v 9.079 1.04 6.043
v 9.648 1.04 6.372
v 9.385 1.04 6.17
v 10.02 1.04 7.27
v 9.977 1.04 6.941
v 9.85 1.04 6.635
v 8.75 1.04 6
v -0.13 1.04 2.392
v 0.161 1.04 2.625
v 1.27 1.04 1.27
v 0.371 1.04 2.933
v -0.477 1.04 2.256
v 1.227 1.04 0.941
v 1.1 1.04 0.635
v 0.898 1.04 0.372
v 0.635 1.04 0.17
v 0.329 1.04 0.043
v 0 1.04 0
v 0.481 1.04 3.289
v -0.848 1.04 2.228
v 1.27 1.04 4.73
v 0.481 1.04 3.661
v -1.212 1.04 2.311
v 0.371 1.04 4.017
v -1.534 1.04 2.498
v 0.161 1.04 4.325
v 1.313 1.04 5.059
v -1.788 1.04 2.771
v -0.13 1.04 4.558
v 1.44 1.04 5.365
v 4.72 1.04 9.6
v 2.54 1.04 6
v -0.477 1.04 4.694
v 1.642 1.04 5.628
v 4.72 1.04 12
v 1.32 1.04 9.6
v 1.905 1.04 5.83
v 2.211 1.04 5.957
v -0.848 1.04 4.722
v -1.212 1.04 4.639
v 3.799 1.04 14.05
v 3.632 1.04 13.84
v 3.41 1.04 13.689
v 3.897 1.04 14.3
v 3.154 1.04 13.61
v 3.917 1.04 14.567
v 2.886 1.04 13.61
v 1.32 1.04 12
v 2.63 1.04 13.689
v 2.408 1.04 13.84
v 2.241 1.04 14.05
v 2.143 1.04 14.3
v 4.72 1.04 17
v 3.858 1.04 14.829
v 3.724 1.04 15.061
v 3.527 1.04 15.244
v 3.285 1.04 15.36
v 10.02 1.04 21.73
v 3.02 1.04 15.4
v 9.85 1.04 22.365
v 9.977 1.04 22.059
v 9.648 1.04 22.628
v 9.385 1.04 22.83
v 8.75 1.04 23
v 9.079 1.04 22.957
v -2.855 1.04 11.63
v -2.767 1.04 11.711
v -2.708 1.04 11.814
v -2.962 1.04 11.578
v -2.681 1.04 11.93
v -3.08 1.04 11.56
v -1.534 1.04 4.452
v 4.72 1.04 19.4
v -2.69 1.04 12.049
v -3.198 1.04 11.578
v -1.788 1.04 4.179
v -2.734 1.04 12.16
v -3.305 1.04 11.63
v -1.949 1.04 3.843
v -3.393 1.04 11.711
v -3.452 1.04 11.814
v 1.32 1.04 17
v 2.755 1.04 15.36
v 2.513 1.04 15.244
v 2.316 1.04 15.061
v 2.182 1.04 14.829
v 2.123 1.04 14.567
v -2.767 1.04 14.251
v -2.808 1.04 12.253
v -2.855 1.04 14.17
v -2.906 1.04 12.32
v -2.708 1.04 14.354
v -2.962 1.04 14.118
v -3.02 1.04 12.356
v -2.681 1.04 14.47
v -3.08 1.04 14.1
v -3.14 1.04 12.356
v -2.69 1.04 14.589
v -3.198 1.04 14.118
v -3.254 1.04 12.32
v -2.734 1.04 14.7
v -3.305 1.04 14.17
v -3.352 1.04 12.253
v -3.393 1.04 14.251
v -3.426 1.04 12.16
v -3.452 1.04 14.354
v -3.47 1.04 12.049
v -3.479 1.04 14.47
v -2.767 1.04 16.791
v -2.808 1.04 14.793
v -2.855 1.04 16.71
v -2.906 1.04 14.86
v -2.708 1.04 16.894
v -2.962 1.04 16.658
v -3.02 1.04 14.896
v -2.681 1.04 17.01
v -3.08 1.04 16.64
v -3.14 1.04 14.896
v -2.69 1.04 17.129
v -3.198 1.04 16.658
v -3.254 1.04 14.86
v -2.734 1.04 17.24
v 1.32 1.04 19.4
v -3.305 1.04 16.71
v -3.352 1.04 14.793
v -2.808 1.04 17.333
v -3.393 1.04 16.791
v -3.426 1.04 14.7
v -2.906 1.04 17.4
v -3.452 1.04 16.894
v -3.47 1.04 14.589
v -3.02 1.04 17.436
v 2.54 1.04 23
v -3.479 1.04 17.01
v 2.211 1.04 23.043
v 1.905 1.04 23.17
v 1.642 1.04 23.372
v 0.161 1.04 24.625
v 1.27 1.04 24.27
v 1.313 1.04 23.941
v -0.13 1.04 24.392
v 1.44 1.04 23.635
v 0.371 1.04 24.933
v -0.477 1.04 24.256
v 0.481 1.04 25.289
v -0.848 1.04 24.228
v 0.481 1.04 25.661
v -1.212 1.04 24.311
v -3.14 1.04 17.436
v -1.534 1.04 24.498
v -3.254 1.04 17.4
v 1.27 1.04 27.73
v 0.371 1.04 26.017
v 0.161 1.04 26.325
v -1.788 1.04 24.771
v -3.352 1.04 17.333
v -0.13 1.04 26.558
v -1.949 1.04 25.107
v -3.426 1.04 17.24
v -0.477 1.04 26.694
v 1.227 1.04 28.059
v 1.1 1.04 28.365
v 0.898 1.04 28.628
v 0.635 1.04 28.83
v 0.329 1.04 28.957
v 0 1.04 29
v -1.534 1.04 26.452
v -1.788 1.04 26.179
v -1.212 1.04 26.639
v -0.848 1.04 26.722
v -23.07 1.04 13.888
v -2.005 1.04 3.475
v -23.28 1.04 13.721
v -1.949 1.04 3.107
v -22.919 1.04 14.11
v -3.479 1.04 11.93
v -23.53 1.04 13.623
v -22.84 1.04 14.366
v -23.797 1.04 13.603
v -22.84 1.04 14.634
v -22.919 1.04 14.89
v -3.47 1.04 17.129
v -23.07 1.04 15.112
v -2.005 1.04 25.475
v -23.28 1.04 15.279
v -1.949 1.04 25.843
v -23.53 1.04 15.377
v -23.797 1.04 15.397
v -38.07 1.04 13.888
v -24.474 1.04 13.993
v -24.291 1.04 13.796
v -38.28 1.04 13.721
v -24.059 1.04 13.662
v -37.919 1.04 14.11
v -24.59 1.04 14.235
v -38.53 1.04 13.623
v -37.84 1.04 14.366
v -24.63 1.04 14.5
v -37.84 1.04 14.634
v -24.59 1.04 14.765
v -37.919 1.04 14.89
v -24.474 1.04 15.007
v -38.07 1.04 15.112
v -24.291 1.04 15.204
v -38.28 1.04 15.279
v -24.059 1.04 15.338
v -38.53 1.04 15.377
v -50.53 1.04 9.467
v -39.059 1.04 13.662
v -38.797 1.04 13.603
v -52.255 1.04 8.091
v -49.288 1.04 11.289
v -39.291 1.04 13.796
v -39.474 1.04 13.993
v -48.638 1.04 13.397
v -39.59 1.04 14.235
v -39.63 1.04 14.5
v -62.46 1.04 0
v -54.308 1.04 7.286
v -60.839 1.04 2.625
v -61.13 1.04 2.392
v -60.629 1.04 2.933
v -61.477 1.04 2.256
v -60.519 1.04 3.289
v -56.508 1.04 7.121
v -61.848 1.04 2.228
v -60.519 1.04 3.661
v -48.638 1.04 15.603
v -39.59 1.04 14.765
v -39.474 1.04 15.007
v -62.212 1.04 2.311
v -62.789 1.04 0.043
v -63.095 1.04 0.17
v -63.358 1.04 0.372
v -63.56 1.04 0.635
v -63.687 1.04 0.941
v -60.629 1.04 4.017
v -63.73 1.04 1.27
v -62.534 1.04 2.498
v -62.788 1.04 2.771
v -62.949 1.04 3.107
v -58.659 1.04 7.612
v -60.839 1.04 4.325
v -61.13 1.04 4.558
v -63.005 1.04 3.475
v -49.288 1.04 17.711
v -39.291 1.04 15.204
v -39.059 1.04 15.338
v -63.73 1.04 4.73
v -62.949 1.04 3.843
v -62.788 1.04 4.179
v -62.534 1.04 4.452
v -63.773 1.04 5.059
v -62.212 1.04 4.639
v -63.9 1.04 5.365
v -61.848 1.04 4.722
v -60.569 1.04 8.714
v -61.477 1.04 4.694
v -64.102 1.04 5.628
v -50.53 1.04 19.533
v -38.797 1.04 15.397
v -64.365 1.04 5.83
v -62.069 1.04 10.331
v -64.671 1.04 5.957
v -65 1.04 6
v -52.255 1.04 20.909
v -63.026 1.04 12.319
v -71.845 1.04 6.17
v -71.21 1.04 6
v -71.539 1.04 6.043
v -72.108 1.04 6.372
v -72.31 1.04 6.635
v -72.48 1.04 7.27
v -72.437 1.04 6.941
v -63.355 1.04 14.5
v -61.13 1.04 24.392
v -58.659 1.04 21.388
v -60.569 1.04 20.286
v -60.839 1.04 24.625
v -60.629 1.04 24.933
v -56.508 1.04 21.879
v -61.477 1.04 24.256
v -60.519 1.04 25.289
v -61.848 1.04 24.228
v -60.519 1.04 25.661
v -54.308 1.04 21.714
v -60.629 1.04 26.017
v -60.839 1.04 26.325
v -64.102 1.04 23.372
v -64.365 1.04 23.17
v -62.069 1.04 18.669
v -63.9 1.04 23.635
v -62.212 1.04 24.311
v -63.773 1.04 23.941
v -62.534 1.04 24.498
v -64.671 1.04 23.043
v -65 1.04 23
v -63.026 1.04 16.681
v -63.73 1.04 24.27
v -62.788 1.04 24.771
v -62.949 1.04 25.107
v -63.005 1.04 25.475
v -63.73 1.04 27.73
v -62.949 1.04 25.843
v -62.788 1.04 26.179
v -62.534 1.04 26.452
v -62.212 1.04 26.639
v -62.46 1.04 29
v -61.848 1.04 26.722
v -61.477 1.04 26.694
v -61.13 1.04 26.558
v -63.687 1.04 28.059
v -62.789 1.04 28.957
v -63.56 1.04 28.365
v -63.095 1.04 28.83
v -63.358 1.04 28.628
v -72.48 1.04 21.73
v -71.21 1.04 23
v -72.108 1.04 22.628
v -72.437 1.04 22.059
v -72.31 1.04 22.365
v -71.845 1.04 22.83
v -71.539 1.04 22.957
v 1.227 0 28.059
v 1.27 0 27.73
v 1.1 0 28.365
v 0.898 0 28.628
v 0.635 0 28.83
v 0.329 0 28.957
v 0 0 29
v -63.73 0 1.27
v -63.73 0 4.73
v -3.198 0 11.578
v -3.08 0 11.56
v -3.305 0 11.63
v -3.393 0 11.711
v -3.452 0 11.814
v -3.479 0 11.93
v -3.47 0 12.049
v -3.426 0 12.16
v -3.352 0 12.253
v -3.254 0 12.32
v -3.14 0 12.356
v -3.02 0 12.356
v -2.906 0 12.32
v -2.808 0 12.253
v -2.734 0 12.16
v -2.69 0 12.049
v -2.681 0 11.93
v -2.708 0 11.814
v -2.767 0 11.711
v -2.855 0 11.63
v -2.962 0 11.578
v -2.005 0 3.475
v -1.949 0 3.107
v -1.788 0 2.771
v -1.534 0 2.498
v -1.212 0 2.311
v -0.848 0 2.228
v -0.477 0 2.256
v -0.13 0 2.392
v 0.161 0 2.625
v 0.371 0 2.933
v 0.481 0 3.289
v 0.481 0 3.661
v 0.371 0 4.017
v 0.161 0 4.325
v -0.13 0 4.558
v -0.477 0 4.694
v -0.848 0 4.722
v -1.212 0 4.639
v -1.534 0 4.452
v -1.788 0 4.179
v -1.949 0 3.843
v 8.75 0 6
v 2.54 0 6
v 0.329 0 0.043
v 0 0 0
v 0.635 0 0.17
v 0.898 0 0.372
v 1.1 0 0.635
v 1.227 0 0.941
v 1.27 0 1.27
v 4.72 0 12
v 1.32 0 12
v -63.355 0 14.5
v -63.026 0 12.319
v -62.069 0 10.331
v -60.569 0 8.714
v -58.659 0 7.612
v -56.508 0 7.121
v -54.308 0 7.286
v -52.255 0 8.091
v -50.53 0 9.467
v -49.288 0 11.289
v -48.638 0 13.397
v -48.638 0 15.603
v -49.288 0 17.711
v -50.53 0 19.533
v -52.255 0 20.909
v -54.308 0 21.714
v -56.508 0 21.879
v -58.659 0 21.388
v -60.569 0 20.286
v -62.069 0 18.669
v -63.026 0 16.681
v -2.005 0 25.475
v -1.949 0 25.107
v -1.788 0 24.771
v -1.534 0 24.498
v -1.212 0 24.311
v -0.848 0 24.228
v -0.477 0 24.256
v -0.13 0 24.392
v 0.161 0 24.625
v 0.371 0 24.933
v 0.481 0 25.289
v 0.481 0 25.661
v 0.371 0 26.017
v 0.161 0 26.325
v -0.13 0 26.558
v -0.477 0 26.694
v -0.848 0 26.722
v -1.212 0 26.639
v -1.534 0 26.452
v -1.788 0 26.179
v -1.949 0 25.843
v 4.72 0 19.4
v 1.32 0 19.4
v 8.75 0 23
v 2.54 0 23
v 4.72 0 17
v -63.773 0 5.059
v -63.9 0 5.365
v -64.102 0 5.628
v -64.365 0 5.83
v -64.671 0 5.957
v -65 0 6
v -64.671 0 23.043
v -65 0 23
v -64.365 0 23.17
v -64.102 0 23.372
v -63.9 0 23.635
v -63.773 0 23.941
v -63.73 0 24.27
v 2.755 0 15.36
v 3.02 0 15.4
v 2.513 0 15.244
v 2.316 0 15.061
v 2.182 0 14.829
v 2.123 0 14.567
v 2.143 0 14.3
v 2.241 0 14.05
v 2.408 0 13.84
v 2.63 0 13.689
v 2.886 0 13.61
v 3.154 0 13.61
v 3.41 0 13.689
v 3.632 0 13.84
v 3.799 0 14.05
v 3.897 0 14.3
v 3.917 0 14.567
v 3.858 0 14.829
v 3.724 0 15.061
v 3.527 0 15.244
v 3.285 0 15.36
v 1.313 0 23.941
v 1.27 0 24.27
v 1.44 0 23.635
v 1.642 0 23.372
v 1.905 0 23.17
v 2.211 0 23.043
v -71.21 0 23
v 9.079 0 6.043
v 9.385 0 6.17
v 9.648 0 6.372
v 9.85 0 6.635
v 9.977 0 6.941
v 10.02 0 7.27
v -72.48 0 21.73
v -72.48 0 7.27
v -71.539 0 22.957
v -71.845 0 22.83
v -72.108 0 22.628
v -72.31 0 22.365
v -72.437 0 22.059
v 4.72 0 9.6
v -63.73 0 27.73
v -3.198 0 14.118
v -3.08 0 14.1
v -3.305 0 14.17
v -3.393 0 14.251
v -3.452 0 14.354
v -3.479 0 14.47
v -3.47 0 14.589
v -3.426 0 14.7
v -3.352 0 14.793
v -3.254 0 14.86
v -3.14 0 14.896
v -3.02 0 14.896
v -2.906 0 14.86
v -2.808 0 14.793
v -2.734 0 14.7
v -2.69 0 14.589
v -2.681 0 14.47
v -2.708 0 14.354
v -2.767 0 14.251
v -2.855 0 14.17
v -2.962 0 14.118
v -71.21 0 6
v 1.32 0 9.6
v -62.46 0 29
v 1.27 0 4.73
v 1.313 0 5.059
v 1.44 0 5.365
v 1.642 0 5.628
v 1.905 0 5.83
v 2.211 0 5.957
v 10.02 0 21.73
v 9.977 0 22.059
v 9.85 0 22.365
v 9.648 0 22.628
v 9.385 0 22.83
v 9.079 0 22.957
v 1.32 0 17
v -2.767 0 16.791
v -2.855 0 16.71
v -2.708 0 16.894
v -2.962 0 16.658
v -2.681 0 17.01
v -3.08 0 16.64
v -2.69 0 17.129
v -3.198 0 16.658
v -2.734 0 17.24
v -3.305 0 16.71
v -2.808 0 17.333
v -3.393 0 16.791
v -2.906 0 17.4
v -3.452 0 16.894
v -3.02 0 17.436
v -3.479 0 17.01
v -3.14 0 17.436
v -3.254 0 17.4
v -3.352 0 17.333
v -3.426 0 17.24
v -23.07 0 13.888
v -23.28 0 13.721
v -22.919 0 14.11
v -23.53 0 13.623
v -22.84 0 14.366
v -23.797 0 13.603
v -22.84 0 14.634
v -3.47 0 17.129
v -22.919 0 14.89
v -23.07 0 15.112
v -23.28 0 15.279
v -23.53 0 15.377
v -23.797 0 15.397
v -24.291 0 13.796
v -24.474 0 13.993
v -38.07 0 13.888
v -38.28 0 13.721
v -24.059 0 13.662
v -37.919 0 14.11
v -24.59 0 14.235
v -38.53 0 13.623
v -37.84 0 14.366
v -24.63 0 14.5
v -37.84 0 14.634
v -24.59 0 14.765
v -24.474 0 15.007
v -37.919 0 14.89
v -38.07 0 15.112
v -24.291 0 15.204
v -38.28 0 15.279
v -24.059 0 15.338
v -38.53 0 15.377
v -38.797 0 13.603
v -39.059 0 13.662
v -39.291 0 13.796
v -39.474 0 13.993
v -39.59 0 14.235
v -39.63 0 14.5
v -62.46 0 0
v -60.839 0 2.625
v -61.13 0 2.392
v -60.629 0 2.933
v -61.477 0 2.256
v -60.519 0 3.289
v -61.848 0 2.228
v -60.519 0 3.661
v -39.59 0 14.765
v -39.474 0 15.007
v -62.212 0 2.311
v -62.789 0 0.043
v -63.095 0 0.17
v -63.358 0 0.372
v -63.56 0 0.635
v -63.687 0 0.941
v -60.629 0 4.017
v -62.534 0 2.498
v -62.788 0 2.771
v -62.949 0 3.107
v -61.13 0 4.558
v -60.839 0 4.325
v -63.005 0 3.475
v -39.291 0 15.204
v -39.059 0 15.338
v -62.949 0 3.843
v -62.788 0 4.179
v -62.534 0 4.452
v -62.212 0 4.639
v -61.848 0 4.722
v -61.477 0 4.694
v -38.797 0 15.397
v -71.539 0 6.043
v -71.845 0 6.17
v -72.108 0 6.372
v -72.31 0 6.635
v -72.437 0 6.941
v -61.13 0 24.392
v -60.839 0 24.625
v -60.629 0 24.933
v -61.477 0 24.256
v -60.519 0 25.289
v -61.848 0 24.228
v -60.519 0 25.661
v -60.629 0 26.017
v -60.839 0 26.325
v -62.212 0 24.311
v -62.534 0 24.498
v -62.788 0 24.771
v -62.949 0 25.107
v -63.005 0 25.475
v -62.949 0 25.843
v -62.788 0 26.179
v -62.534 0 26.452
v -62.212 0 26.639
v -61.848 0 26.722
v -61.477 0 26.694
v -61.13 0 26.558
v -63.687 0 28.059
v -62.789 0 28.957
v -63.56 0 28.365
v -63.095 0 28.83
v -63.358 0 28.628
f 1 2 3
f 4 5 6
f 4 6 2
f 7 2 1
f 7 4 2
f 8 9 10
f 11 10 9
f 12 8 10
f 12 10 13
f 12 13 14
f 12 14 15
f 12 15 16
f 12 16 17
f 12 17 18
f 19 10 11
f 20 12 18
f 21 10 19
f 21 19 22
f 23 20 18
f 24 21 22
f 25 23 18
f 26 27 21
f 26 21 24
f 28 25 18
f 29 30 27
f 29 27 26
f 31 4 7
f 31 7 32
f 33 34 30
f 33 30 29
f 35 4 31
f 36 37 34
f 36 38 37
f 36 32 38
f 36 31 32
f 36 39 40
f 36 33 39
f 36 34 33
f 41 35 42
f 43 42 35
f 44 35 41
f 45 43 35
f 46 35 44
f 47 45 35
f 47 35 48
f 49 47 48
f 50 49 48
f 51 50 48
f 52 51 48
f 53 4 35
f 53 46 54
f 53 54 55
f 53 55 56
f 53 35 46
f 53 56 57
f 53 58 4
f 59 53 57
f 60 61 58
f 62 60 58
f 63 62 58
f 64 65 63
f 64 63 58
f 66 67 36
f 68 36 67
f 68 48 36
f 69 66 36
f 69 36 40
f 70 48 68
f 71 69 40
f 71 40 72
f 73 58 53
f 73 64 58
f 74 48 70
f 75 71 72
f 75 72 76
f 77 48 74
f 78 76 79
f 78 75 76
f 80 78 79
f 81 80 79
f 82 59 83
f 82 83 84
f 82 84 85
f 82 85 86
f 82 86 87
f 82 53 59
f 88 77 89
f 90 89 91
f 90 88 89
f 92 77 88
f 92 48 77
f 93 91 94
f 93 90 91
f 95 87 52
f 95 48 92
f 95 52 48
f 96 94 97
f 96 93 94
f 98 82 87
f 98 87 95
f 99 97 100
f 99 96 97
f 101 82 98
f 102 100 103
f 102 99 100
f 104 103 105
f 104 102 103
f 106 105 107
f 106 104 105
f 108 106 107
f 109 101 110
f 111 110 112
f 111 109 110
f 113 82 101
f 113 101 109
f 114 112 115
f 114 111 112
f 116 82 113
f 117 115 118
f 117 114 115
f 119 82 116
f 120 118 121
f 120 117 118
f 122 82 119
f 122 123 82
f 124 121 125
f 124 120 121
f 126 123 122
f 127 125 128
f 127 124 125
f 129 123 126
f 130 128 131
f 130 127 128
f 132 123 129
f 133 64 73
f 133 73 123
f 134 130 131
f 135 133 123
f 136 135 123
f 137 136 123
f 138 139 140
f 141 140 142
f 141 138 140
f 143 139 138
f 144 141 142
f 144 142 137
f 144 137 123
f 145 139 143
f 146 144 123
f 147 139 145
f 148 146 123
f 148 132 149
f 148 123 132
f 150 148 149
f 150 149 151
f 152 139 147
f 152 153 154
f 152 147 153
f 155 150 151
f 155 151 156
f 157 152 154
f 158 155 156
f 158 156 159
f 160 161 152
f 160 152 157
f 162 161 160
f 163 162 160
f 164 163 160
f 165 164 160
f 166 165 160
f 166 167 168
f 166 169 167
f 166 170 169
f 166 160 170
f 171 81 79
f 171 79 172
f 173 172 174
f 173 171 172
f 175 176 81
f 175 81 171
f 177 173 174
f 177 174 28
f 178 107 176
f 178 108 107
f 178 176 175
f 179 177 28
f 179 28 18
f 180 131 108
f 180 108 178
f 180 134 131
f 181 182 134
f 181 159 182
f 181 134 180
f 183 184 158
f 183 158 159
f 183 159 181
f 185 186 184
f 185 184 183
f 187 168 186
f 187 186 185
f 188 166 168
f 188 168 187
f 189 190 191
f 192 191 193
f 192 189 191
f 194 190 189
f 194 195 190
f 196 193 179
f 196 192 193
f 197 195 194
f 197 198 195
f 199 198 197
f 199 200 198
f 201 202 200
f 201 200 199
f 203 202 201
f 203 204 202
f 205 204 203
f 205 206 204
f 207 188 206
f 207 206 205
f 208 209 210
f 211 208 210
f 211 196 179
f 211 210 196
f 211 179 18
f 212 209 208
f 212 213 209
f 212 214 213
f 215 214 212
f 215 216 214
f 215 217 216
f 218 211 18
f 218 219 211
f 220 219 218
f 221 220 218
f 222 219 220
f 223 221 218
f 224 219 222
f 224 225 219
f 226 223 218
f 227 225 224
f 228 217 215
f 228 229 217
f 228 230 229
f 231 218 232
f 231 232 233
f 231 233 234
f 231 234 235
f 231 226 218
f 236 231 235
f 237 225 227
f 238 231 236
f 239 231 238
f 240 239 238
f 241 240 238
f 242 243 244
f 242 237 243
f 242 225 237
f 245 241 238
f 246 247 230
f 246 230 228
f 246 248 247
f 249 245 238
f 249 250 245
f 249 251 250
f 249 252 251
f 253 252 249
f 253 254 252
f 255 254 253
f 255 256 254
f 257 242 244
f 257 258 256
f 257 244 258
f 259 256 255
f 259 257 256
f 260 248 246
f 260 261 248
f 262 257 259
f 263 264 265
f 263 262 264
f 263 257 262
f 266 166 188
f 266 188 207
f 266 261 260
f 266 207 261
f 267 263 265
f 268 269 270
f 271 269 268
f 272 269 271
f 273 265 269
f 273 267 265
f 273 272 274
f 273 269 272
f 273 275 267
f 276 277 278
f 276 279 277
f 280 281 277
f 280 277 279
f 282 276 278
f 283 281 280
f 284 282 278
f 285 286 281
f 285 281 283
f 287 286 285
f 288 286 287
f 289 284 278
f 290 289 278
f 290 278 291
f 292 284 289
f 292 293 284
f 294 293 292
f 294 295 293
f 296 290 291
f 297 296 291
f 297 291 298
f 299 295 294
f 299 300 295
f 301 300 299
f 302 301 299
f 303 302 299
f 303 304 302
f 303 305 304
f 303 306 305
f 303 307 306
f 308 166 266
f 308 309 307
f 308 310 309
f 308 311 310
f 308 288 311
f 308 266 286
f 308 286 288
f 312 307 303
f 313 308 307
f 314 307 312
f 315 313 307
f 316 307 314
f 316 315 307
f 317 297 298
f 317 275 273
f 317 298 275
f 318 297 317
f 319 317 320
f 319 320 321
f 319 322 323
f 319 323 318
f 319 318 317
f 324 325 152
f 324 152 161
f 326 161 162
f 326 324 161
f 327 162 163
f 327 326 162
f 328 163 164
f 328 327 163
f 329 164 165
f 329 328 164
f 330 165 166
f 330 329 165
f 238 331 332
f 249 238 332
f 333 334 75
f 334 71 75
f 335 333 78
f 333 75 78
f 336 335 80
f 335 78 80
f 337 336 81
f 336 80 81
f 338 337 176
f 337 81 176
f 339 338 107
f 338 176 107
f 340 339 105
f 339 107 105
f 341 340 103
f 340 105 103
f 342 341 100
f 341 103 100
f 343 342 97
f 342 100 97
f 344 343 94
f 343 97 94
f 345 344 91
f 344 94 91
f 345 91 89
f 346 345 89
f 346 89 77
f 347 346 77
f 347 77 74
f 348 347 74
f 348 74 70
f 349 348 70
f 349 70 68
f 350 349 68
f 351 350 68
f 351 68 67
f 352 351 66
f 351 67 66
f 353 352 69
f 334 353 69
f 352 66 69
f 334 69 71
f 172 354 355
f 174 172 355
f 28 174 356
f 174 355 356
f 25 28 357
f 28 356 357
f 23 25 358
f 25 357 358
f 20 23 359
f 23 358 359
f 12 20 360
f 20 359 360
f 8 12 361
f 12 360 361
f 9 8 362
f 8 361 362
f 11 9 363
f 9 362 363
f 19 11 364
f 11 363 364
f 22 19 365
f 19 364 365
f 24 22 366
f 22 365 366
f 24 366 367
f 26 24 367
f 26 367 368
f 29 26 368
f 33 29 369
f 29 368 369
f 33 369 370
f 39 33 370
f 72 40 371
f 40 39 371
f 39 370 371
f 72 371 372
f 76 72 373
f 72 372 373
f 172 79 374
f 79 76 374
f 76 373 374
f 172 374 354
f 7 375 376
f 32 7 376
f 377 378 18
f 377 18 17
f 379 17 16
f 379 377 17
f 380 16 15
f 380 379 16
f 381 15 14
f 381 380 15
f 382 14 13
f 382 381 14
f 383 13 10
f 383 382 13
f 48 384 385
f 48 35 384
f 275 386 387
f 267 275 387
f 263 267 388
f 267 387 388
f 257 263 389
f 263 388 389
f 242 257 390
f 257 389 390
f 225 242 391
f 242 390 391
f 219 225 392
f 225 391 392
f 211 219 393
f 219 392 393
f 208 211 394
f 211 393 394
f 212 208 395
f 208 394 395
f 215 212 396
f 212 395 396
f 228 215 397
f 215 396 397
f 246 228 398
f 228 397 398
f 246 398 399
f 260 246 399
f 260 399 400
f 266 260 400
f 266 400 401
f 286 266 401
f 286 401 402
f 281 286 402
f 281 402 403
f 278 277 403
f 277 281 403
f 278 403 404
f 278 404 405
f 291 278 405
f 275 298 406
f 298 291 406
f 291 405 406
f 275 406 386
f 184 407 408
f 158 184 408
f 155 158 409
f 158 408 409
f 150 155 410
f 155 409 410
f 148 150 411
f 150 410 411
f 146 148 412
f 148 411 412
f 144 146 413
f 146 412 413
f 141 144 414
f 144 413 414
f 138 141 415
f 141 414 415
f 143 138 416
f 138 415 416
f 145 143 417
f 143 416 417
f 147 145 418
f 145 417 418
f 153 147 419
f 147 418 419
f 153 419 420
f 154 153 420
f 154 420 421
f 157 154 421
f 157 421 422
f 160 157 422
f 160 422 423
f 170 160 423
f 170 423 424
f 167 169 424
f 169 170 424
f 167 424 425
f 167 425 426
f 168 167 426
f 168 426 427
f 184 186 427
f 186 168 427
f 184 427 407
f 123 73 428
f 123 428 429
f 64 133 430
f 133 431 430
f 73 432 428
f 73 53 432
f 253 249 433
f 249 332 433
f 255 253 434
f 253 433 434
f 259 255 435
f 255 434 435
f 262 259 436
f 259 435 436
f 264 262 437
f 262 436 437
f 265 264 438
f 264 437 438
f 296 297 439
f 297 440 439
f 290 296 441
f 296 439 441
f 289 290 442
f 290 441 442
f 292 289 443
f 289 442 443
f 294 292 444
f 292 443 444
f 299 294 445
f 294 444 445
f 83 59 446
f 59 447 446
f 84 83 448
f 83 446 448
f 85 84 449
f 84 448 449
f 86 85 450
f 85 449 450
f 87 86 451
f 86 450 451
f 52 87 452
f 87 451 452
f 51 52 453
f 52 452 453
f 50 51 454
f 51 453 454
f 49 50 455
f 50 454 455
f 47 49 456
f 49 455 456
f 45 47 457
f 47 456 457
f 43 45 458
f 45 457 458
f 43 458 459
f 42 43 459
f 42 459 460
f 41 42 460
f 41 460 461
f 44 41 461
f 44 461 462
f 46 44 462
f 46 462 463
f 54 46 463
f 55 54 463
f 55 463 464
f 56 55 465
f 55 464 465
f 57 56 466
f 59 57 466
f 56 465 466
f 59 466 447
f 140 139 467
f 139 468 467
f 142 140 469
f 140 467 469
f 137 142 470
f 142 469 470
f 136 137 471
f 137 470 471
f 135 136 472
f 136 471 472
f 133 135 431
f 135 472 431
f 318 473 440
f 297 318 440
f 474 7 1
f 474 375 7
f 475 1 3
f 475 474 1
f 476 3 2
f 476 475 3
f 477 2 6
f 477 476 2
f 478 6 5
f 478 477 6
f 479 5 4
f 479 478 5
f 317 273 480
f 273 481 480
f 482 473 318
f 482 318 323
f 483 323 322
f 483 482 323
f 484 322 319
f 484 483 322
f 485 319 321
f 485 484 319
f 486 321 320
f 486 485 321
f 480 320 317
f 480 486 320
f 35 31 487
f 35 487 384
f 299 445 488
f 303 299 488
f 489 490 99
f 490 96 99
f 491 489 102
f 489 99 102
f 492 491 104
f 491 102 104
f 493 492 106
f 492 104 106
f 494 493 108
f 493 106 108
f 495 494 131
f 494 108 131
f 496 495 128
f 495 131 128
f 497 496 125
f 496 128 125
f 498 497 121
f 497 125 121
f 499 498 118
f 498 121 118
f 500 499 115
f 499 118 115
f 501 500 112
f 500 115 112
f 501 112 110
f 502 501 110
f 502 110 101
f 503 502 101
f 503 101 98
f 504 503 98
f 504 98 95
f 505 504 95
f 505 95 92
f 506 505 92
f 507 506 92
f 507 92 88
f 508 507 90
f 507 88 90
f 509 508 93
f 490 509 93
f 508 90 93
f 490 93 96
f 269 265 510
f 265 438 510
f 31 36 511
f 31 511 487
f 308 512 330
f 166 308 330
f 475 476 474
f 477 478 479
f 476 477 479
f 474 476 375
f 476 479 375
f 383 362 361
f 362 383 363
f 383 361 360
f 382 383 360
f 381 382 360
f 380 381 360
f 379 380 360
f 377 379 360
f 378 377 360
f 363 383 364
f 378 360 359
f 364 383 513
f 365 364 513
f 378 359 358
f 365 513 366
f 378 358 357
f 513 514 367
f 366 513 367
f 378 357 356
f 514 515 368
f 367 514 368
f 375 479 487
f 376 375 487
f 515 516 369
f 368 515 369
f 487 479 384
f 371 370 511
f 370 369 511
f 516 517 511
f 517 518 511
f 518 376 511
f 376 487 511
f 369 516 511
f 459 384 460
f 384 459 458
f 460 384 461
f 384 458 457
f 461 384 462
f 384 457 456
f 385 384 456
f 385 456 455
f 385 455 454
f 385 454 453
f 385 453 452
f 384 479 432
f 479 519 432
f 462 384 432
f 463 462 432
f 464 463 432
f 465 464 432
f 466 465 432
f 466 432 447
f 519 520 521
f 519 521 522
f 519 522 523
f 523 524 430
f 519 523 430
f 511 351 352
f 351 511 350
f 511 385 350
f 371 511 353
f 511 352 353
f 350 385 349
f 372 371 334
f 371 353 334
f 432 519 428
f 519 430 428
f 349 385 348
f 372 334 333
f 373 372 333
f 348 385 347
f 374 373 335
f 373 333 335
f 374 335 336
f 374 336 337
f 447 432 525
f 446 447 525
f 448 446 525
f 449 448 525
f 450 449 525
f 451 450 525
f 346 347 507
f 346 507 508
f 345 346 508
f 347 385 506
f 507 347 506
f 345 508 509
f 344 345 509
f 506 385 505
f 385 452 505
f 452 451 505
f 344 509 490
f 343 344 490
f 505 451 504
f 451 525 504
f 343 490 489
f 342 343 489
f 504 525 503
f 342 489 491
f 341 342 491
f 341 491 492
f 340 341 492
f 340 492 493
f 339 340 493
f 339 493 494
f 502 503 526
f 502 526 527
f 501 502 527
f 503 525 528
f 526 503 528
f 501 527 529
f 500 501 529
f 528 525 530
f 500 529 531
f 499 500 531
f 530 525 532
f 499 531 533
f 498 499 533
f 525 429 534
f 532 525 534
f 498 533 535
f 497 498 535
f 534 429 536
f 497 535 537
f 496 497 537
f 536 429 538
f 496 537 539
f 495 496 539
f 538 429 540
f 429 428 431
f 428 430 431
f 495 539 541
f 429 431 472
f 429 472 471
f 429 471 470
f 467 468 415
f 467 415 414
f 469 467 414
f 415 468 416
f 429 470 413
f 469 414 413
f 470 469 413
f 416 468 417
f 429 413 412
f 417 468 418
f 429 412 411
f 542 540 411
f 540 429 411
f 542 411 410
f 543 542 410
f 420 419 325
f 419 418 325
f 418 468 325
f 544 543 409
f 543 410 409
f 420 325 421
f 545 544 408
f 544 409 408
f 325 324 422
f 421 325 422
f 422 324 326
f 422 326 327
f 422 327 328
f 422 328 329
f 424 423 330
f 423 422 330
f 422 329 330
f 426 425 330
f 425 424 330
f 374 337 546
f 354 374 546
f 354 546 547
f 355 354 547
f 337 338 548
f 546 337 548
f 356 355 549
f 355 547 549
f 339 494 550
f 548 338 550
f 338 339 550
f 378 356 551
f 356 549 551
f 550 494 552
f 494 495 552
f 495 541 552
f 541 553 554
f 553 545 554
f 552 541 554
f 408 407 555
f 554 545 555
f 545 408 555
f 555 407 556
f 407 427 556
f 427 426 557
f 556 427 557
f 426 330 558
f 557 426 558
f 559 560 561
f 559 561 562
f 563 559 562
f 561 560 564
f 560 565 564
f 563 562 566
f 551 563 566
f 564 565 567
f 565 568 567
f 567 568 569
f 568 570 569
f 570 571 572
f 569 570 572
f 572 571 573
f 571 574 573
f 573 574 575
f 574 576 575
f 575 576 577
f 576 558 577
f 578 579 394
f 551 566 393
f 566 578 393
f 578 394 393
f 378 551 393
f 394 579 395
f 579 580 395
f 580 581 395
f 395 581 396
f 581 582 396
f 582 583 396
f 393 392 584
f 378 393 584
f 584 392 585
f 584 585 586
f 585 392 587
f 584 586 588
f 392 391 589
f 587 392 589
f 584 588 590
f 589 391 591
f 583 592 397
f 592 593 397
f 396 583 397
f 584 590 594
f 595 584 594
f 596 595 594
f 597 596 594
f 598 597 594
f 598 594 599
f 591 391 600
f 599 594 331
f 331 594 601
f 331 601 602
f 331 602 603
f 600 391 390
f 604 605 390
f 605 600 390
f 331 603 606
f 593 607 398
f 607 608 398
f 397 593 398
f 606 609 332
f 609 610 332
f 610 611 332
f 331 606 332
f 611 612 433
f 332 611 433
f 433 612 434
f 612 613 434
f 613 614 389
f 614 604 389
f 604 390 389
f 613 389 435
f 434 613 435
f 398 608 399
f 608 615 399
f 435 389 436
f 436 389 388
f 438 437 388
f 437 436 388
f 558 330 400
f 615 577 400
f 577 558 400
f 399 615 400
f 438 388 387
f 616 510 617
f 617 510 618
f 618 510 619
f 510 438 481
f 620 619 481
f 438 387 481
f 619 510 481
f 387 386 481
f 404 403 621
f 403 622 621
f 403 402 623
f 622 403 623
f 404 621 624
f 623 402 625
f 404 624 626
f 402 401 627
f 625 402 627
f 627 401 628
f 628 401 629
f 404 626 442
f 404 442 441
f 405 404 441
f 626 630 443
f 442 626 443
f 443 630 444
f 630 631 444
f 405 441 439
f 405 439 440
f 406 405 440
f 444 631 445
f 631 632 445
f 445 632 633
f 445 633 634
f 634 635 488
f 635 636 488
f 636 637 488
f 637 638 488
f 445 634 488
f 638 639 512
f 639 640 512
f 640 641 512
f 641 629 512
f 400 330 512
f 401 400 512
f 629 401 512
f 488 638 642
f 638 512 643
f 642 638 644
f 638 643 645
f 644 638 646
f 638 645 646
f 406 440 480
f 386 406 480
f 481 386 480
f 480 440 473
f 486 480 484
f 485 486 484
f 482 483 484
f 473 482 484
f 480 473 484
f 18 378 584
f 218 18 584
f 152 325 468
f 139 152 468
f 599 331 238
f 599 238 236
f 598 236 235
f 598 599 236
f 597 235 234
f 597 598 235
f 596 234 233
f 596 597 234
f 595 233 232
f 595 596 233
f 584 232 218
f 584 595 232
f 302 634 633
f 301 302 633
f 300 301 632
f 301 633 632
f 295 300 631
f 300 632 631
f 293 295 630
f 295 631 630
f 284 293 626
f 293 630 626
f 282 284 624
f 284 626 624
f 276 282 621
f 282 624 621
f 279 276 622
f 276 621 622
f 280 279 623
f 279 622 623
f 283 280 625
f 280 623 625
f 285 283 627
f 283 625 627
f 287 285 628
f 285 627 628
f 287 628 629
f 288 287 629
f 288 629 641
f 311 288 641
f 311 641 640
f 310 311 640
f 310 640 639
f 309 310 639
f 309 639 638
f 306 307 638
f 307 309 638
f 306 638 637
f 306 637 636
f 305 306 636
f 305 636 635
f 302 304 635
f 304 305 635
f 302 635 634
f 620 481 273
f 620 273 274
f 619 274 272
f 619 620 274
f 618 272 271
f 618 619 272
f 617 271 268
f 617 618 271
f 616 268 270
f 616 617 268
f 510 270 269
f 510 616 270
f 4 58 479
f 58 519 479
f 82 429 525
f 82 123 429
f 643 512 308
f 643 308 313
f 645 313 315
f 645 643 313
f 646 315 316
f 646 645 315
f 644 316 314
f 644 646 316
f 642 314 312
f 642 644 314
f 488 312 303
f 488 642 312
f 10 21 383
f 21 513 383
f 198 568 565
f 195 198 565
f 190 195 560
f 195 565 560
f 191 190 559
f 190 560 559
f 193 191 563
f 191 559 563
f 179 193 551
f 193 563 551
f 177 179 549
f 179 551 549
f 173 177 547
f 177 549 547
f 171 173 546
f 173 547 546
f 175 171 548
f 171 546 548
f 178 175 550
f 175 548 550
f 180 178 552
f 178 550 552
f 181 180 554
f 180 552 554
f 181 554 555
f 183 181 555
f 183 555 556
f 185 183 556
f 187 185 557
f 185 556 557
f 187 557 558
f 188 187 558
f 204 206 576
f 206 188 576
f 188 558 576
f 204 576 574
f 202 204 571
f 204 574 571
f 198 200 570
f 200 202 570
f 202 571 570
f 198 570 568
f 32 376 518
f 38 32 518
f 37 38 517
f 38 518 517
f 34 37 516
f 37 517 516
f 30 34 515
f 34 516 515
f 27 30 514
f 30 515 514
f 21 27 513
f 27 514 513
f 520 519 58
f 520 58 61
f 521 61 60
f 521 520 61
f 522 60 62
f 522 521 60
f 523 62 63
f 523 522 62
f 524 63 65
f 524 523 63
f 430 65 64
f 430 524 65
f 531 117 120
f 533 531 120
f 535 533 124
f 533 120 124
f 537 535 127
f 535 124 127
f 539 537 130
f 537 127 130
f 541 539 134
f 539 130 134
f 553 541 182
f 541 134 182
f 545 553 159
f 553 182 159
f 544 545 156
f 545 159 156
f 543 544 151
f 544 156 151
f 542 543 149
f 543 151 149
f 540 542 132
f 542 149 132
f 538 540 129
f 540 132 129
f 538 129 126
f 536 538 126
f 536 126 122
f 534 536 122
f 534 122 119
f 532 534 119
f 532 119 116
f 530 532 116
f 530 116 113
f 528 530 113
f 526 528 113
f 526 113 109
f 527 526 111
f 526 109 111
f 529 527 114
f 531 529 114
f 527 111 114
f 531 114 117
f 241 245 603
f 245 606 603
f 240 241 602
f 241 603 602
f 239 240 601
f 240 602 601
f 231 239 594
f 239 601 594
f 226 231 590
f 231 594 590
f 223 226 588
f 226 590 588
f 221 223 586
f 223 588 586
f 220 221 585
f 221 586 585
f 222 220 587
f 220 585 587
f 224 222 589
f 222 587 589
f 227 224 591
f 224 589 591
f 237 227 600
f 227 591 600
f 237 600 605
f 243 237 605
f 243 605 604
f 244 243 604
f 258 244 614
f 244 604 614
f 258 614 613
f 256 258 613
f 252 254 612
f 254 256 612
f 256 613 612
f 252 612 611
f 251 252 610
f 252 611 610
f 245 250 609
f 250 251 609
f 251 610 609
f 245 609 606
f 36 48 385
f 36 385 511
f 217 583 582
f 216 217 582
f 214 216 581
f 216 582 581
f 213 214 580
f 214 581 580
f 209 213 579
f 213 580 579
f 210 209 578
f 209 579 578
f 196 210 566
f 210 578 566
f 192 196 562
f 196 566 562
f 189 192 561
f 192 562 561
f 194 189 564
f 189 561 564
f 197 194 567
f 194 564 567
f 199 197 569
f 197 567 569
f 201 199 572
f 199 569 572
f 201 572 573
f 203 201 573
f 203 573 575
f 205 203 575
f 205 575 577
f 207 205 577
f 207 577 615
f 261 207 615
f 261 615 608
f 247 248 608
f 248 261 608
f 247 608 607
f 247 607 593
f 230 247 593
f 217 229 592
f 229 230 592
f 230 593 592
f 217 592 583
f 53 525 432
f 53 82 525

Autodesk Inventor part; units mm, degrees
ref_plane "YZ Plane" through (0, 0, 0) normal (1, 0, 0) x (0, 1, 0)
ref_plane "XZ Plane" through (0, 0, 0) normal (0, 1, 0) x (-1, 0, 0)
ref_plane "XY Plane" through (0, 0, 0) normal (0, 0, 1) x (1, 0, 0)
sketch "Boceto1" plane through (0, 0, 0) normal (0, 1, 0) x (-1, 0, 0)
  arc A0 (-10.02, 7.27) -> (-8.75, 6) centre (-8.75, 7.27) ccw
  line L0 (-8.75, 6) -> (-2.54, 6)
  arc A1 (-1.27, 4.73) -> (-2.54, 6) centre (-2.54, 4.73) ccw
  line L1 (-1.27, 4.73) -> (-1.27, 1.27)
  arc A2 (-1.27, 1.27) -> (0, 0) centre (0, 1.27) ccw
  line L2 (0, 0) -> (62.46, 0)
  arc A3 (62.46, 0) -> (63.73, 1.27) centre (62.46, 1.27) ccw
  line L3 (63.73, 1.27) -> (63.73, 4.73)
  arc A4 (65, 6) -> (63.73, 4.73) centre (65, 4.73) ccw
  line L4 (65, 6) -> (71.21, 6)
  arc A5 (71.21, 6) -> (72.48, 7.27) centre (71.21, 7.27) ccw
  line L5 (72.48, 7.27) -> (72.48, 21.73)
  arc A6 (72.48, 21.73) -> (71.21, 23) centre (71.21, 21.73) ccw
  line L6 (71.21, 23) -> (65, 23)
  arc A7 (63.73, 24.27) -> (65, 23) centre (65, 24.27) ccw
  line L7 (63.73, 24.27) -> (63.73, 27.73)
  arc A8 (63.73, 27.73) -> (62.46, 29) centre (62.46, 27.73) ccw
  line L8 (62.46, 29) -> (0, 29)
  arc A9 (0, 29) -> (-1.27, 27.73) centre (0, 27.73) ccw
  line L9 (-1.27, 27.73) -> (-1.27, 24.27)
  arc A10 (-2.54, 23) -> (-1.27, 24.27) centre (-2.54, 24.27) ccw
  line L10 (-2.54, 23) -> (-8.75, 23)
  arc A11 (-8.75, 23) -> (-10.02, 21.73) centre (-8.75, 21.73) ccw
  line L11 (-10.02, 21.73) -> (-10.02, 7.27)
  circle A12 centre (55.955, 14.5) radius 7.4
  circle A13 centre (61.755, 25.475) radius 1.25
  circle A14 centre (0.755, 3.475) radius 1.25
  circle A15 centre (0.755, 25.475) radius 1.25
  circle A16 centre (61.755, 3.475) radius 1.25
  circle A17 centre (38.73, 14.5) radius 0.9
  circle A18 centre (23.73, 14.5) radius 0.9
  point P0 (0, 0)
extrude "Extrusión1" add sketch "Boceto1" along normal blind 1.04
sketch "Boceto2" plane through (0, 1.04, 0) normal (0, 1, 0) x (1, 0, 0)
  circle A0 centre (3.02, -14.5) radius 0.9
  line L0 (-71.21, -23) -> (-65, -23) projected
  line L1 (-72.48, -7.27) -> (-72.48, -21.73) projected
  line L2 (2.54, -23) -> (8.75, -23) projected
  line L3 (10.02, -21.73) -> (10.02, -7.27) projected
  point P0 (0, 0)
  dimension "d3" = 1.8
  dimension "d6" = 8.5
  dimension "d7" = 7
hole "Agujero1" at (3.02, 1.04, 14.5) direction (0, -1, 0) diameter 1.8 end through all
sketch "Boceto3" plane through (0, 0, 0) normal (0, -1, 0) x (1, 0, 0)
  circle A0 centre (-3.08, 17.04) radius 0.4
  line L0 (10.02, 21.73) -> (10.02, 7.27) projected
  line L1 (-62.46, 29) -> (0, 29) projected
  circle A1 centre (-3.08, 14.5) radius 0.4
  circle A2 centre (-3.08, 11.96) radius 0.4
  line L2 (0, 0) -> (-62.46, 0) projected
  dimension "d15" = 0.8
  dimension "d16" = 13.1
  dimension "d17" = 11.96
  dimension "d18" = 0.8
  dimension "d19" = 0.8
  dimension "d20" = 13.1
  dimension "d21" = 13.1
  dimension "d22" = 11.96
  dimension "d23" = 2.54
  dimension "d24" = 2.54
hole "Agujero2" at (-3.08, 0, 17.04) at (-3.08, 0, 14.5) at (-3.08, 0, 11.96) direction (0, 1, 0) diameter 0.8 end through all
sketch "Boceto4" plane through (0, 1.04, 0) normal (0, 1, 0) x (1, 0, 0)
  line L0 (4.72, -19.4) -> (1.32, -19.4)
  line L1 (1.32, -19.4) -> (1.32, -17)
  line L2 (1.32, -17) -> (4.72, -17)
  line L3 (4.72, -17) -> (4.72, -19.4)
  line L4 (2.54, -23) -> (8.75, -23) projected
  line L5 (10.02, -21.73) -> (10.02, -7.27) projected
  line L6 (4.72, -12) -> (1.32, -12)
  line L7 (1.32, -12) -> (1.32, -9.6)
  line L8 (1.32, -9.6) -> (4.72, -9.6)
  line L9 (4.72, -9.6) -> (4.72, -12)
  line L10 (8.75, -6) -> (2.54, -6) projected
  point P0 (0, 0)
  dimension "d32" = 3.4
  dimension "d33" = 2.4
  dimension "d34" = 3.6
  dimension "d35" = 5.3
  dimension "d36" = 2.4
  dimension "d37" = 5.3
  dimension "d38" = 3.6
extrude "Extrusión2" cut sketch "Boceto4" against normal through all
properties part number "Interstage B2"
